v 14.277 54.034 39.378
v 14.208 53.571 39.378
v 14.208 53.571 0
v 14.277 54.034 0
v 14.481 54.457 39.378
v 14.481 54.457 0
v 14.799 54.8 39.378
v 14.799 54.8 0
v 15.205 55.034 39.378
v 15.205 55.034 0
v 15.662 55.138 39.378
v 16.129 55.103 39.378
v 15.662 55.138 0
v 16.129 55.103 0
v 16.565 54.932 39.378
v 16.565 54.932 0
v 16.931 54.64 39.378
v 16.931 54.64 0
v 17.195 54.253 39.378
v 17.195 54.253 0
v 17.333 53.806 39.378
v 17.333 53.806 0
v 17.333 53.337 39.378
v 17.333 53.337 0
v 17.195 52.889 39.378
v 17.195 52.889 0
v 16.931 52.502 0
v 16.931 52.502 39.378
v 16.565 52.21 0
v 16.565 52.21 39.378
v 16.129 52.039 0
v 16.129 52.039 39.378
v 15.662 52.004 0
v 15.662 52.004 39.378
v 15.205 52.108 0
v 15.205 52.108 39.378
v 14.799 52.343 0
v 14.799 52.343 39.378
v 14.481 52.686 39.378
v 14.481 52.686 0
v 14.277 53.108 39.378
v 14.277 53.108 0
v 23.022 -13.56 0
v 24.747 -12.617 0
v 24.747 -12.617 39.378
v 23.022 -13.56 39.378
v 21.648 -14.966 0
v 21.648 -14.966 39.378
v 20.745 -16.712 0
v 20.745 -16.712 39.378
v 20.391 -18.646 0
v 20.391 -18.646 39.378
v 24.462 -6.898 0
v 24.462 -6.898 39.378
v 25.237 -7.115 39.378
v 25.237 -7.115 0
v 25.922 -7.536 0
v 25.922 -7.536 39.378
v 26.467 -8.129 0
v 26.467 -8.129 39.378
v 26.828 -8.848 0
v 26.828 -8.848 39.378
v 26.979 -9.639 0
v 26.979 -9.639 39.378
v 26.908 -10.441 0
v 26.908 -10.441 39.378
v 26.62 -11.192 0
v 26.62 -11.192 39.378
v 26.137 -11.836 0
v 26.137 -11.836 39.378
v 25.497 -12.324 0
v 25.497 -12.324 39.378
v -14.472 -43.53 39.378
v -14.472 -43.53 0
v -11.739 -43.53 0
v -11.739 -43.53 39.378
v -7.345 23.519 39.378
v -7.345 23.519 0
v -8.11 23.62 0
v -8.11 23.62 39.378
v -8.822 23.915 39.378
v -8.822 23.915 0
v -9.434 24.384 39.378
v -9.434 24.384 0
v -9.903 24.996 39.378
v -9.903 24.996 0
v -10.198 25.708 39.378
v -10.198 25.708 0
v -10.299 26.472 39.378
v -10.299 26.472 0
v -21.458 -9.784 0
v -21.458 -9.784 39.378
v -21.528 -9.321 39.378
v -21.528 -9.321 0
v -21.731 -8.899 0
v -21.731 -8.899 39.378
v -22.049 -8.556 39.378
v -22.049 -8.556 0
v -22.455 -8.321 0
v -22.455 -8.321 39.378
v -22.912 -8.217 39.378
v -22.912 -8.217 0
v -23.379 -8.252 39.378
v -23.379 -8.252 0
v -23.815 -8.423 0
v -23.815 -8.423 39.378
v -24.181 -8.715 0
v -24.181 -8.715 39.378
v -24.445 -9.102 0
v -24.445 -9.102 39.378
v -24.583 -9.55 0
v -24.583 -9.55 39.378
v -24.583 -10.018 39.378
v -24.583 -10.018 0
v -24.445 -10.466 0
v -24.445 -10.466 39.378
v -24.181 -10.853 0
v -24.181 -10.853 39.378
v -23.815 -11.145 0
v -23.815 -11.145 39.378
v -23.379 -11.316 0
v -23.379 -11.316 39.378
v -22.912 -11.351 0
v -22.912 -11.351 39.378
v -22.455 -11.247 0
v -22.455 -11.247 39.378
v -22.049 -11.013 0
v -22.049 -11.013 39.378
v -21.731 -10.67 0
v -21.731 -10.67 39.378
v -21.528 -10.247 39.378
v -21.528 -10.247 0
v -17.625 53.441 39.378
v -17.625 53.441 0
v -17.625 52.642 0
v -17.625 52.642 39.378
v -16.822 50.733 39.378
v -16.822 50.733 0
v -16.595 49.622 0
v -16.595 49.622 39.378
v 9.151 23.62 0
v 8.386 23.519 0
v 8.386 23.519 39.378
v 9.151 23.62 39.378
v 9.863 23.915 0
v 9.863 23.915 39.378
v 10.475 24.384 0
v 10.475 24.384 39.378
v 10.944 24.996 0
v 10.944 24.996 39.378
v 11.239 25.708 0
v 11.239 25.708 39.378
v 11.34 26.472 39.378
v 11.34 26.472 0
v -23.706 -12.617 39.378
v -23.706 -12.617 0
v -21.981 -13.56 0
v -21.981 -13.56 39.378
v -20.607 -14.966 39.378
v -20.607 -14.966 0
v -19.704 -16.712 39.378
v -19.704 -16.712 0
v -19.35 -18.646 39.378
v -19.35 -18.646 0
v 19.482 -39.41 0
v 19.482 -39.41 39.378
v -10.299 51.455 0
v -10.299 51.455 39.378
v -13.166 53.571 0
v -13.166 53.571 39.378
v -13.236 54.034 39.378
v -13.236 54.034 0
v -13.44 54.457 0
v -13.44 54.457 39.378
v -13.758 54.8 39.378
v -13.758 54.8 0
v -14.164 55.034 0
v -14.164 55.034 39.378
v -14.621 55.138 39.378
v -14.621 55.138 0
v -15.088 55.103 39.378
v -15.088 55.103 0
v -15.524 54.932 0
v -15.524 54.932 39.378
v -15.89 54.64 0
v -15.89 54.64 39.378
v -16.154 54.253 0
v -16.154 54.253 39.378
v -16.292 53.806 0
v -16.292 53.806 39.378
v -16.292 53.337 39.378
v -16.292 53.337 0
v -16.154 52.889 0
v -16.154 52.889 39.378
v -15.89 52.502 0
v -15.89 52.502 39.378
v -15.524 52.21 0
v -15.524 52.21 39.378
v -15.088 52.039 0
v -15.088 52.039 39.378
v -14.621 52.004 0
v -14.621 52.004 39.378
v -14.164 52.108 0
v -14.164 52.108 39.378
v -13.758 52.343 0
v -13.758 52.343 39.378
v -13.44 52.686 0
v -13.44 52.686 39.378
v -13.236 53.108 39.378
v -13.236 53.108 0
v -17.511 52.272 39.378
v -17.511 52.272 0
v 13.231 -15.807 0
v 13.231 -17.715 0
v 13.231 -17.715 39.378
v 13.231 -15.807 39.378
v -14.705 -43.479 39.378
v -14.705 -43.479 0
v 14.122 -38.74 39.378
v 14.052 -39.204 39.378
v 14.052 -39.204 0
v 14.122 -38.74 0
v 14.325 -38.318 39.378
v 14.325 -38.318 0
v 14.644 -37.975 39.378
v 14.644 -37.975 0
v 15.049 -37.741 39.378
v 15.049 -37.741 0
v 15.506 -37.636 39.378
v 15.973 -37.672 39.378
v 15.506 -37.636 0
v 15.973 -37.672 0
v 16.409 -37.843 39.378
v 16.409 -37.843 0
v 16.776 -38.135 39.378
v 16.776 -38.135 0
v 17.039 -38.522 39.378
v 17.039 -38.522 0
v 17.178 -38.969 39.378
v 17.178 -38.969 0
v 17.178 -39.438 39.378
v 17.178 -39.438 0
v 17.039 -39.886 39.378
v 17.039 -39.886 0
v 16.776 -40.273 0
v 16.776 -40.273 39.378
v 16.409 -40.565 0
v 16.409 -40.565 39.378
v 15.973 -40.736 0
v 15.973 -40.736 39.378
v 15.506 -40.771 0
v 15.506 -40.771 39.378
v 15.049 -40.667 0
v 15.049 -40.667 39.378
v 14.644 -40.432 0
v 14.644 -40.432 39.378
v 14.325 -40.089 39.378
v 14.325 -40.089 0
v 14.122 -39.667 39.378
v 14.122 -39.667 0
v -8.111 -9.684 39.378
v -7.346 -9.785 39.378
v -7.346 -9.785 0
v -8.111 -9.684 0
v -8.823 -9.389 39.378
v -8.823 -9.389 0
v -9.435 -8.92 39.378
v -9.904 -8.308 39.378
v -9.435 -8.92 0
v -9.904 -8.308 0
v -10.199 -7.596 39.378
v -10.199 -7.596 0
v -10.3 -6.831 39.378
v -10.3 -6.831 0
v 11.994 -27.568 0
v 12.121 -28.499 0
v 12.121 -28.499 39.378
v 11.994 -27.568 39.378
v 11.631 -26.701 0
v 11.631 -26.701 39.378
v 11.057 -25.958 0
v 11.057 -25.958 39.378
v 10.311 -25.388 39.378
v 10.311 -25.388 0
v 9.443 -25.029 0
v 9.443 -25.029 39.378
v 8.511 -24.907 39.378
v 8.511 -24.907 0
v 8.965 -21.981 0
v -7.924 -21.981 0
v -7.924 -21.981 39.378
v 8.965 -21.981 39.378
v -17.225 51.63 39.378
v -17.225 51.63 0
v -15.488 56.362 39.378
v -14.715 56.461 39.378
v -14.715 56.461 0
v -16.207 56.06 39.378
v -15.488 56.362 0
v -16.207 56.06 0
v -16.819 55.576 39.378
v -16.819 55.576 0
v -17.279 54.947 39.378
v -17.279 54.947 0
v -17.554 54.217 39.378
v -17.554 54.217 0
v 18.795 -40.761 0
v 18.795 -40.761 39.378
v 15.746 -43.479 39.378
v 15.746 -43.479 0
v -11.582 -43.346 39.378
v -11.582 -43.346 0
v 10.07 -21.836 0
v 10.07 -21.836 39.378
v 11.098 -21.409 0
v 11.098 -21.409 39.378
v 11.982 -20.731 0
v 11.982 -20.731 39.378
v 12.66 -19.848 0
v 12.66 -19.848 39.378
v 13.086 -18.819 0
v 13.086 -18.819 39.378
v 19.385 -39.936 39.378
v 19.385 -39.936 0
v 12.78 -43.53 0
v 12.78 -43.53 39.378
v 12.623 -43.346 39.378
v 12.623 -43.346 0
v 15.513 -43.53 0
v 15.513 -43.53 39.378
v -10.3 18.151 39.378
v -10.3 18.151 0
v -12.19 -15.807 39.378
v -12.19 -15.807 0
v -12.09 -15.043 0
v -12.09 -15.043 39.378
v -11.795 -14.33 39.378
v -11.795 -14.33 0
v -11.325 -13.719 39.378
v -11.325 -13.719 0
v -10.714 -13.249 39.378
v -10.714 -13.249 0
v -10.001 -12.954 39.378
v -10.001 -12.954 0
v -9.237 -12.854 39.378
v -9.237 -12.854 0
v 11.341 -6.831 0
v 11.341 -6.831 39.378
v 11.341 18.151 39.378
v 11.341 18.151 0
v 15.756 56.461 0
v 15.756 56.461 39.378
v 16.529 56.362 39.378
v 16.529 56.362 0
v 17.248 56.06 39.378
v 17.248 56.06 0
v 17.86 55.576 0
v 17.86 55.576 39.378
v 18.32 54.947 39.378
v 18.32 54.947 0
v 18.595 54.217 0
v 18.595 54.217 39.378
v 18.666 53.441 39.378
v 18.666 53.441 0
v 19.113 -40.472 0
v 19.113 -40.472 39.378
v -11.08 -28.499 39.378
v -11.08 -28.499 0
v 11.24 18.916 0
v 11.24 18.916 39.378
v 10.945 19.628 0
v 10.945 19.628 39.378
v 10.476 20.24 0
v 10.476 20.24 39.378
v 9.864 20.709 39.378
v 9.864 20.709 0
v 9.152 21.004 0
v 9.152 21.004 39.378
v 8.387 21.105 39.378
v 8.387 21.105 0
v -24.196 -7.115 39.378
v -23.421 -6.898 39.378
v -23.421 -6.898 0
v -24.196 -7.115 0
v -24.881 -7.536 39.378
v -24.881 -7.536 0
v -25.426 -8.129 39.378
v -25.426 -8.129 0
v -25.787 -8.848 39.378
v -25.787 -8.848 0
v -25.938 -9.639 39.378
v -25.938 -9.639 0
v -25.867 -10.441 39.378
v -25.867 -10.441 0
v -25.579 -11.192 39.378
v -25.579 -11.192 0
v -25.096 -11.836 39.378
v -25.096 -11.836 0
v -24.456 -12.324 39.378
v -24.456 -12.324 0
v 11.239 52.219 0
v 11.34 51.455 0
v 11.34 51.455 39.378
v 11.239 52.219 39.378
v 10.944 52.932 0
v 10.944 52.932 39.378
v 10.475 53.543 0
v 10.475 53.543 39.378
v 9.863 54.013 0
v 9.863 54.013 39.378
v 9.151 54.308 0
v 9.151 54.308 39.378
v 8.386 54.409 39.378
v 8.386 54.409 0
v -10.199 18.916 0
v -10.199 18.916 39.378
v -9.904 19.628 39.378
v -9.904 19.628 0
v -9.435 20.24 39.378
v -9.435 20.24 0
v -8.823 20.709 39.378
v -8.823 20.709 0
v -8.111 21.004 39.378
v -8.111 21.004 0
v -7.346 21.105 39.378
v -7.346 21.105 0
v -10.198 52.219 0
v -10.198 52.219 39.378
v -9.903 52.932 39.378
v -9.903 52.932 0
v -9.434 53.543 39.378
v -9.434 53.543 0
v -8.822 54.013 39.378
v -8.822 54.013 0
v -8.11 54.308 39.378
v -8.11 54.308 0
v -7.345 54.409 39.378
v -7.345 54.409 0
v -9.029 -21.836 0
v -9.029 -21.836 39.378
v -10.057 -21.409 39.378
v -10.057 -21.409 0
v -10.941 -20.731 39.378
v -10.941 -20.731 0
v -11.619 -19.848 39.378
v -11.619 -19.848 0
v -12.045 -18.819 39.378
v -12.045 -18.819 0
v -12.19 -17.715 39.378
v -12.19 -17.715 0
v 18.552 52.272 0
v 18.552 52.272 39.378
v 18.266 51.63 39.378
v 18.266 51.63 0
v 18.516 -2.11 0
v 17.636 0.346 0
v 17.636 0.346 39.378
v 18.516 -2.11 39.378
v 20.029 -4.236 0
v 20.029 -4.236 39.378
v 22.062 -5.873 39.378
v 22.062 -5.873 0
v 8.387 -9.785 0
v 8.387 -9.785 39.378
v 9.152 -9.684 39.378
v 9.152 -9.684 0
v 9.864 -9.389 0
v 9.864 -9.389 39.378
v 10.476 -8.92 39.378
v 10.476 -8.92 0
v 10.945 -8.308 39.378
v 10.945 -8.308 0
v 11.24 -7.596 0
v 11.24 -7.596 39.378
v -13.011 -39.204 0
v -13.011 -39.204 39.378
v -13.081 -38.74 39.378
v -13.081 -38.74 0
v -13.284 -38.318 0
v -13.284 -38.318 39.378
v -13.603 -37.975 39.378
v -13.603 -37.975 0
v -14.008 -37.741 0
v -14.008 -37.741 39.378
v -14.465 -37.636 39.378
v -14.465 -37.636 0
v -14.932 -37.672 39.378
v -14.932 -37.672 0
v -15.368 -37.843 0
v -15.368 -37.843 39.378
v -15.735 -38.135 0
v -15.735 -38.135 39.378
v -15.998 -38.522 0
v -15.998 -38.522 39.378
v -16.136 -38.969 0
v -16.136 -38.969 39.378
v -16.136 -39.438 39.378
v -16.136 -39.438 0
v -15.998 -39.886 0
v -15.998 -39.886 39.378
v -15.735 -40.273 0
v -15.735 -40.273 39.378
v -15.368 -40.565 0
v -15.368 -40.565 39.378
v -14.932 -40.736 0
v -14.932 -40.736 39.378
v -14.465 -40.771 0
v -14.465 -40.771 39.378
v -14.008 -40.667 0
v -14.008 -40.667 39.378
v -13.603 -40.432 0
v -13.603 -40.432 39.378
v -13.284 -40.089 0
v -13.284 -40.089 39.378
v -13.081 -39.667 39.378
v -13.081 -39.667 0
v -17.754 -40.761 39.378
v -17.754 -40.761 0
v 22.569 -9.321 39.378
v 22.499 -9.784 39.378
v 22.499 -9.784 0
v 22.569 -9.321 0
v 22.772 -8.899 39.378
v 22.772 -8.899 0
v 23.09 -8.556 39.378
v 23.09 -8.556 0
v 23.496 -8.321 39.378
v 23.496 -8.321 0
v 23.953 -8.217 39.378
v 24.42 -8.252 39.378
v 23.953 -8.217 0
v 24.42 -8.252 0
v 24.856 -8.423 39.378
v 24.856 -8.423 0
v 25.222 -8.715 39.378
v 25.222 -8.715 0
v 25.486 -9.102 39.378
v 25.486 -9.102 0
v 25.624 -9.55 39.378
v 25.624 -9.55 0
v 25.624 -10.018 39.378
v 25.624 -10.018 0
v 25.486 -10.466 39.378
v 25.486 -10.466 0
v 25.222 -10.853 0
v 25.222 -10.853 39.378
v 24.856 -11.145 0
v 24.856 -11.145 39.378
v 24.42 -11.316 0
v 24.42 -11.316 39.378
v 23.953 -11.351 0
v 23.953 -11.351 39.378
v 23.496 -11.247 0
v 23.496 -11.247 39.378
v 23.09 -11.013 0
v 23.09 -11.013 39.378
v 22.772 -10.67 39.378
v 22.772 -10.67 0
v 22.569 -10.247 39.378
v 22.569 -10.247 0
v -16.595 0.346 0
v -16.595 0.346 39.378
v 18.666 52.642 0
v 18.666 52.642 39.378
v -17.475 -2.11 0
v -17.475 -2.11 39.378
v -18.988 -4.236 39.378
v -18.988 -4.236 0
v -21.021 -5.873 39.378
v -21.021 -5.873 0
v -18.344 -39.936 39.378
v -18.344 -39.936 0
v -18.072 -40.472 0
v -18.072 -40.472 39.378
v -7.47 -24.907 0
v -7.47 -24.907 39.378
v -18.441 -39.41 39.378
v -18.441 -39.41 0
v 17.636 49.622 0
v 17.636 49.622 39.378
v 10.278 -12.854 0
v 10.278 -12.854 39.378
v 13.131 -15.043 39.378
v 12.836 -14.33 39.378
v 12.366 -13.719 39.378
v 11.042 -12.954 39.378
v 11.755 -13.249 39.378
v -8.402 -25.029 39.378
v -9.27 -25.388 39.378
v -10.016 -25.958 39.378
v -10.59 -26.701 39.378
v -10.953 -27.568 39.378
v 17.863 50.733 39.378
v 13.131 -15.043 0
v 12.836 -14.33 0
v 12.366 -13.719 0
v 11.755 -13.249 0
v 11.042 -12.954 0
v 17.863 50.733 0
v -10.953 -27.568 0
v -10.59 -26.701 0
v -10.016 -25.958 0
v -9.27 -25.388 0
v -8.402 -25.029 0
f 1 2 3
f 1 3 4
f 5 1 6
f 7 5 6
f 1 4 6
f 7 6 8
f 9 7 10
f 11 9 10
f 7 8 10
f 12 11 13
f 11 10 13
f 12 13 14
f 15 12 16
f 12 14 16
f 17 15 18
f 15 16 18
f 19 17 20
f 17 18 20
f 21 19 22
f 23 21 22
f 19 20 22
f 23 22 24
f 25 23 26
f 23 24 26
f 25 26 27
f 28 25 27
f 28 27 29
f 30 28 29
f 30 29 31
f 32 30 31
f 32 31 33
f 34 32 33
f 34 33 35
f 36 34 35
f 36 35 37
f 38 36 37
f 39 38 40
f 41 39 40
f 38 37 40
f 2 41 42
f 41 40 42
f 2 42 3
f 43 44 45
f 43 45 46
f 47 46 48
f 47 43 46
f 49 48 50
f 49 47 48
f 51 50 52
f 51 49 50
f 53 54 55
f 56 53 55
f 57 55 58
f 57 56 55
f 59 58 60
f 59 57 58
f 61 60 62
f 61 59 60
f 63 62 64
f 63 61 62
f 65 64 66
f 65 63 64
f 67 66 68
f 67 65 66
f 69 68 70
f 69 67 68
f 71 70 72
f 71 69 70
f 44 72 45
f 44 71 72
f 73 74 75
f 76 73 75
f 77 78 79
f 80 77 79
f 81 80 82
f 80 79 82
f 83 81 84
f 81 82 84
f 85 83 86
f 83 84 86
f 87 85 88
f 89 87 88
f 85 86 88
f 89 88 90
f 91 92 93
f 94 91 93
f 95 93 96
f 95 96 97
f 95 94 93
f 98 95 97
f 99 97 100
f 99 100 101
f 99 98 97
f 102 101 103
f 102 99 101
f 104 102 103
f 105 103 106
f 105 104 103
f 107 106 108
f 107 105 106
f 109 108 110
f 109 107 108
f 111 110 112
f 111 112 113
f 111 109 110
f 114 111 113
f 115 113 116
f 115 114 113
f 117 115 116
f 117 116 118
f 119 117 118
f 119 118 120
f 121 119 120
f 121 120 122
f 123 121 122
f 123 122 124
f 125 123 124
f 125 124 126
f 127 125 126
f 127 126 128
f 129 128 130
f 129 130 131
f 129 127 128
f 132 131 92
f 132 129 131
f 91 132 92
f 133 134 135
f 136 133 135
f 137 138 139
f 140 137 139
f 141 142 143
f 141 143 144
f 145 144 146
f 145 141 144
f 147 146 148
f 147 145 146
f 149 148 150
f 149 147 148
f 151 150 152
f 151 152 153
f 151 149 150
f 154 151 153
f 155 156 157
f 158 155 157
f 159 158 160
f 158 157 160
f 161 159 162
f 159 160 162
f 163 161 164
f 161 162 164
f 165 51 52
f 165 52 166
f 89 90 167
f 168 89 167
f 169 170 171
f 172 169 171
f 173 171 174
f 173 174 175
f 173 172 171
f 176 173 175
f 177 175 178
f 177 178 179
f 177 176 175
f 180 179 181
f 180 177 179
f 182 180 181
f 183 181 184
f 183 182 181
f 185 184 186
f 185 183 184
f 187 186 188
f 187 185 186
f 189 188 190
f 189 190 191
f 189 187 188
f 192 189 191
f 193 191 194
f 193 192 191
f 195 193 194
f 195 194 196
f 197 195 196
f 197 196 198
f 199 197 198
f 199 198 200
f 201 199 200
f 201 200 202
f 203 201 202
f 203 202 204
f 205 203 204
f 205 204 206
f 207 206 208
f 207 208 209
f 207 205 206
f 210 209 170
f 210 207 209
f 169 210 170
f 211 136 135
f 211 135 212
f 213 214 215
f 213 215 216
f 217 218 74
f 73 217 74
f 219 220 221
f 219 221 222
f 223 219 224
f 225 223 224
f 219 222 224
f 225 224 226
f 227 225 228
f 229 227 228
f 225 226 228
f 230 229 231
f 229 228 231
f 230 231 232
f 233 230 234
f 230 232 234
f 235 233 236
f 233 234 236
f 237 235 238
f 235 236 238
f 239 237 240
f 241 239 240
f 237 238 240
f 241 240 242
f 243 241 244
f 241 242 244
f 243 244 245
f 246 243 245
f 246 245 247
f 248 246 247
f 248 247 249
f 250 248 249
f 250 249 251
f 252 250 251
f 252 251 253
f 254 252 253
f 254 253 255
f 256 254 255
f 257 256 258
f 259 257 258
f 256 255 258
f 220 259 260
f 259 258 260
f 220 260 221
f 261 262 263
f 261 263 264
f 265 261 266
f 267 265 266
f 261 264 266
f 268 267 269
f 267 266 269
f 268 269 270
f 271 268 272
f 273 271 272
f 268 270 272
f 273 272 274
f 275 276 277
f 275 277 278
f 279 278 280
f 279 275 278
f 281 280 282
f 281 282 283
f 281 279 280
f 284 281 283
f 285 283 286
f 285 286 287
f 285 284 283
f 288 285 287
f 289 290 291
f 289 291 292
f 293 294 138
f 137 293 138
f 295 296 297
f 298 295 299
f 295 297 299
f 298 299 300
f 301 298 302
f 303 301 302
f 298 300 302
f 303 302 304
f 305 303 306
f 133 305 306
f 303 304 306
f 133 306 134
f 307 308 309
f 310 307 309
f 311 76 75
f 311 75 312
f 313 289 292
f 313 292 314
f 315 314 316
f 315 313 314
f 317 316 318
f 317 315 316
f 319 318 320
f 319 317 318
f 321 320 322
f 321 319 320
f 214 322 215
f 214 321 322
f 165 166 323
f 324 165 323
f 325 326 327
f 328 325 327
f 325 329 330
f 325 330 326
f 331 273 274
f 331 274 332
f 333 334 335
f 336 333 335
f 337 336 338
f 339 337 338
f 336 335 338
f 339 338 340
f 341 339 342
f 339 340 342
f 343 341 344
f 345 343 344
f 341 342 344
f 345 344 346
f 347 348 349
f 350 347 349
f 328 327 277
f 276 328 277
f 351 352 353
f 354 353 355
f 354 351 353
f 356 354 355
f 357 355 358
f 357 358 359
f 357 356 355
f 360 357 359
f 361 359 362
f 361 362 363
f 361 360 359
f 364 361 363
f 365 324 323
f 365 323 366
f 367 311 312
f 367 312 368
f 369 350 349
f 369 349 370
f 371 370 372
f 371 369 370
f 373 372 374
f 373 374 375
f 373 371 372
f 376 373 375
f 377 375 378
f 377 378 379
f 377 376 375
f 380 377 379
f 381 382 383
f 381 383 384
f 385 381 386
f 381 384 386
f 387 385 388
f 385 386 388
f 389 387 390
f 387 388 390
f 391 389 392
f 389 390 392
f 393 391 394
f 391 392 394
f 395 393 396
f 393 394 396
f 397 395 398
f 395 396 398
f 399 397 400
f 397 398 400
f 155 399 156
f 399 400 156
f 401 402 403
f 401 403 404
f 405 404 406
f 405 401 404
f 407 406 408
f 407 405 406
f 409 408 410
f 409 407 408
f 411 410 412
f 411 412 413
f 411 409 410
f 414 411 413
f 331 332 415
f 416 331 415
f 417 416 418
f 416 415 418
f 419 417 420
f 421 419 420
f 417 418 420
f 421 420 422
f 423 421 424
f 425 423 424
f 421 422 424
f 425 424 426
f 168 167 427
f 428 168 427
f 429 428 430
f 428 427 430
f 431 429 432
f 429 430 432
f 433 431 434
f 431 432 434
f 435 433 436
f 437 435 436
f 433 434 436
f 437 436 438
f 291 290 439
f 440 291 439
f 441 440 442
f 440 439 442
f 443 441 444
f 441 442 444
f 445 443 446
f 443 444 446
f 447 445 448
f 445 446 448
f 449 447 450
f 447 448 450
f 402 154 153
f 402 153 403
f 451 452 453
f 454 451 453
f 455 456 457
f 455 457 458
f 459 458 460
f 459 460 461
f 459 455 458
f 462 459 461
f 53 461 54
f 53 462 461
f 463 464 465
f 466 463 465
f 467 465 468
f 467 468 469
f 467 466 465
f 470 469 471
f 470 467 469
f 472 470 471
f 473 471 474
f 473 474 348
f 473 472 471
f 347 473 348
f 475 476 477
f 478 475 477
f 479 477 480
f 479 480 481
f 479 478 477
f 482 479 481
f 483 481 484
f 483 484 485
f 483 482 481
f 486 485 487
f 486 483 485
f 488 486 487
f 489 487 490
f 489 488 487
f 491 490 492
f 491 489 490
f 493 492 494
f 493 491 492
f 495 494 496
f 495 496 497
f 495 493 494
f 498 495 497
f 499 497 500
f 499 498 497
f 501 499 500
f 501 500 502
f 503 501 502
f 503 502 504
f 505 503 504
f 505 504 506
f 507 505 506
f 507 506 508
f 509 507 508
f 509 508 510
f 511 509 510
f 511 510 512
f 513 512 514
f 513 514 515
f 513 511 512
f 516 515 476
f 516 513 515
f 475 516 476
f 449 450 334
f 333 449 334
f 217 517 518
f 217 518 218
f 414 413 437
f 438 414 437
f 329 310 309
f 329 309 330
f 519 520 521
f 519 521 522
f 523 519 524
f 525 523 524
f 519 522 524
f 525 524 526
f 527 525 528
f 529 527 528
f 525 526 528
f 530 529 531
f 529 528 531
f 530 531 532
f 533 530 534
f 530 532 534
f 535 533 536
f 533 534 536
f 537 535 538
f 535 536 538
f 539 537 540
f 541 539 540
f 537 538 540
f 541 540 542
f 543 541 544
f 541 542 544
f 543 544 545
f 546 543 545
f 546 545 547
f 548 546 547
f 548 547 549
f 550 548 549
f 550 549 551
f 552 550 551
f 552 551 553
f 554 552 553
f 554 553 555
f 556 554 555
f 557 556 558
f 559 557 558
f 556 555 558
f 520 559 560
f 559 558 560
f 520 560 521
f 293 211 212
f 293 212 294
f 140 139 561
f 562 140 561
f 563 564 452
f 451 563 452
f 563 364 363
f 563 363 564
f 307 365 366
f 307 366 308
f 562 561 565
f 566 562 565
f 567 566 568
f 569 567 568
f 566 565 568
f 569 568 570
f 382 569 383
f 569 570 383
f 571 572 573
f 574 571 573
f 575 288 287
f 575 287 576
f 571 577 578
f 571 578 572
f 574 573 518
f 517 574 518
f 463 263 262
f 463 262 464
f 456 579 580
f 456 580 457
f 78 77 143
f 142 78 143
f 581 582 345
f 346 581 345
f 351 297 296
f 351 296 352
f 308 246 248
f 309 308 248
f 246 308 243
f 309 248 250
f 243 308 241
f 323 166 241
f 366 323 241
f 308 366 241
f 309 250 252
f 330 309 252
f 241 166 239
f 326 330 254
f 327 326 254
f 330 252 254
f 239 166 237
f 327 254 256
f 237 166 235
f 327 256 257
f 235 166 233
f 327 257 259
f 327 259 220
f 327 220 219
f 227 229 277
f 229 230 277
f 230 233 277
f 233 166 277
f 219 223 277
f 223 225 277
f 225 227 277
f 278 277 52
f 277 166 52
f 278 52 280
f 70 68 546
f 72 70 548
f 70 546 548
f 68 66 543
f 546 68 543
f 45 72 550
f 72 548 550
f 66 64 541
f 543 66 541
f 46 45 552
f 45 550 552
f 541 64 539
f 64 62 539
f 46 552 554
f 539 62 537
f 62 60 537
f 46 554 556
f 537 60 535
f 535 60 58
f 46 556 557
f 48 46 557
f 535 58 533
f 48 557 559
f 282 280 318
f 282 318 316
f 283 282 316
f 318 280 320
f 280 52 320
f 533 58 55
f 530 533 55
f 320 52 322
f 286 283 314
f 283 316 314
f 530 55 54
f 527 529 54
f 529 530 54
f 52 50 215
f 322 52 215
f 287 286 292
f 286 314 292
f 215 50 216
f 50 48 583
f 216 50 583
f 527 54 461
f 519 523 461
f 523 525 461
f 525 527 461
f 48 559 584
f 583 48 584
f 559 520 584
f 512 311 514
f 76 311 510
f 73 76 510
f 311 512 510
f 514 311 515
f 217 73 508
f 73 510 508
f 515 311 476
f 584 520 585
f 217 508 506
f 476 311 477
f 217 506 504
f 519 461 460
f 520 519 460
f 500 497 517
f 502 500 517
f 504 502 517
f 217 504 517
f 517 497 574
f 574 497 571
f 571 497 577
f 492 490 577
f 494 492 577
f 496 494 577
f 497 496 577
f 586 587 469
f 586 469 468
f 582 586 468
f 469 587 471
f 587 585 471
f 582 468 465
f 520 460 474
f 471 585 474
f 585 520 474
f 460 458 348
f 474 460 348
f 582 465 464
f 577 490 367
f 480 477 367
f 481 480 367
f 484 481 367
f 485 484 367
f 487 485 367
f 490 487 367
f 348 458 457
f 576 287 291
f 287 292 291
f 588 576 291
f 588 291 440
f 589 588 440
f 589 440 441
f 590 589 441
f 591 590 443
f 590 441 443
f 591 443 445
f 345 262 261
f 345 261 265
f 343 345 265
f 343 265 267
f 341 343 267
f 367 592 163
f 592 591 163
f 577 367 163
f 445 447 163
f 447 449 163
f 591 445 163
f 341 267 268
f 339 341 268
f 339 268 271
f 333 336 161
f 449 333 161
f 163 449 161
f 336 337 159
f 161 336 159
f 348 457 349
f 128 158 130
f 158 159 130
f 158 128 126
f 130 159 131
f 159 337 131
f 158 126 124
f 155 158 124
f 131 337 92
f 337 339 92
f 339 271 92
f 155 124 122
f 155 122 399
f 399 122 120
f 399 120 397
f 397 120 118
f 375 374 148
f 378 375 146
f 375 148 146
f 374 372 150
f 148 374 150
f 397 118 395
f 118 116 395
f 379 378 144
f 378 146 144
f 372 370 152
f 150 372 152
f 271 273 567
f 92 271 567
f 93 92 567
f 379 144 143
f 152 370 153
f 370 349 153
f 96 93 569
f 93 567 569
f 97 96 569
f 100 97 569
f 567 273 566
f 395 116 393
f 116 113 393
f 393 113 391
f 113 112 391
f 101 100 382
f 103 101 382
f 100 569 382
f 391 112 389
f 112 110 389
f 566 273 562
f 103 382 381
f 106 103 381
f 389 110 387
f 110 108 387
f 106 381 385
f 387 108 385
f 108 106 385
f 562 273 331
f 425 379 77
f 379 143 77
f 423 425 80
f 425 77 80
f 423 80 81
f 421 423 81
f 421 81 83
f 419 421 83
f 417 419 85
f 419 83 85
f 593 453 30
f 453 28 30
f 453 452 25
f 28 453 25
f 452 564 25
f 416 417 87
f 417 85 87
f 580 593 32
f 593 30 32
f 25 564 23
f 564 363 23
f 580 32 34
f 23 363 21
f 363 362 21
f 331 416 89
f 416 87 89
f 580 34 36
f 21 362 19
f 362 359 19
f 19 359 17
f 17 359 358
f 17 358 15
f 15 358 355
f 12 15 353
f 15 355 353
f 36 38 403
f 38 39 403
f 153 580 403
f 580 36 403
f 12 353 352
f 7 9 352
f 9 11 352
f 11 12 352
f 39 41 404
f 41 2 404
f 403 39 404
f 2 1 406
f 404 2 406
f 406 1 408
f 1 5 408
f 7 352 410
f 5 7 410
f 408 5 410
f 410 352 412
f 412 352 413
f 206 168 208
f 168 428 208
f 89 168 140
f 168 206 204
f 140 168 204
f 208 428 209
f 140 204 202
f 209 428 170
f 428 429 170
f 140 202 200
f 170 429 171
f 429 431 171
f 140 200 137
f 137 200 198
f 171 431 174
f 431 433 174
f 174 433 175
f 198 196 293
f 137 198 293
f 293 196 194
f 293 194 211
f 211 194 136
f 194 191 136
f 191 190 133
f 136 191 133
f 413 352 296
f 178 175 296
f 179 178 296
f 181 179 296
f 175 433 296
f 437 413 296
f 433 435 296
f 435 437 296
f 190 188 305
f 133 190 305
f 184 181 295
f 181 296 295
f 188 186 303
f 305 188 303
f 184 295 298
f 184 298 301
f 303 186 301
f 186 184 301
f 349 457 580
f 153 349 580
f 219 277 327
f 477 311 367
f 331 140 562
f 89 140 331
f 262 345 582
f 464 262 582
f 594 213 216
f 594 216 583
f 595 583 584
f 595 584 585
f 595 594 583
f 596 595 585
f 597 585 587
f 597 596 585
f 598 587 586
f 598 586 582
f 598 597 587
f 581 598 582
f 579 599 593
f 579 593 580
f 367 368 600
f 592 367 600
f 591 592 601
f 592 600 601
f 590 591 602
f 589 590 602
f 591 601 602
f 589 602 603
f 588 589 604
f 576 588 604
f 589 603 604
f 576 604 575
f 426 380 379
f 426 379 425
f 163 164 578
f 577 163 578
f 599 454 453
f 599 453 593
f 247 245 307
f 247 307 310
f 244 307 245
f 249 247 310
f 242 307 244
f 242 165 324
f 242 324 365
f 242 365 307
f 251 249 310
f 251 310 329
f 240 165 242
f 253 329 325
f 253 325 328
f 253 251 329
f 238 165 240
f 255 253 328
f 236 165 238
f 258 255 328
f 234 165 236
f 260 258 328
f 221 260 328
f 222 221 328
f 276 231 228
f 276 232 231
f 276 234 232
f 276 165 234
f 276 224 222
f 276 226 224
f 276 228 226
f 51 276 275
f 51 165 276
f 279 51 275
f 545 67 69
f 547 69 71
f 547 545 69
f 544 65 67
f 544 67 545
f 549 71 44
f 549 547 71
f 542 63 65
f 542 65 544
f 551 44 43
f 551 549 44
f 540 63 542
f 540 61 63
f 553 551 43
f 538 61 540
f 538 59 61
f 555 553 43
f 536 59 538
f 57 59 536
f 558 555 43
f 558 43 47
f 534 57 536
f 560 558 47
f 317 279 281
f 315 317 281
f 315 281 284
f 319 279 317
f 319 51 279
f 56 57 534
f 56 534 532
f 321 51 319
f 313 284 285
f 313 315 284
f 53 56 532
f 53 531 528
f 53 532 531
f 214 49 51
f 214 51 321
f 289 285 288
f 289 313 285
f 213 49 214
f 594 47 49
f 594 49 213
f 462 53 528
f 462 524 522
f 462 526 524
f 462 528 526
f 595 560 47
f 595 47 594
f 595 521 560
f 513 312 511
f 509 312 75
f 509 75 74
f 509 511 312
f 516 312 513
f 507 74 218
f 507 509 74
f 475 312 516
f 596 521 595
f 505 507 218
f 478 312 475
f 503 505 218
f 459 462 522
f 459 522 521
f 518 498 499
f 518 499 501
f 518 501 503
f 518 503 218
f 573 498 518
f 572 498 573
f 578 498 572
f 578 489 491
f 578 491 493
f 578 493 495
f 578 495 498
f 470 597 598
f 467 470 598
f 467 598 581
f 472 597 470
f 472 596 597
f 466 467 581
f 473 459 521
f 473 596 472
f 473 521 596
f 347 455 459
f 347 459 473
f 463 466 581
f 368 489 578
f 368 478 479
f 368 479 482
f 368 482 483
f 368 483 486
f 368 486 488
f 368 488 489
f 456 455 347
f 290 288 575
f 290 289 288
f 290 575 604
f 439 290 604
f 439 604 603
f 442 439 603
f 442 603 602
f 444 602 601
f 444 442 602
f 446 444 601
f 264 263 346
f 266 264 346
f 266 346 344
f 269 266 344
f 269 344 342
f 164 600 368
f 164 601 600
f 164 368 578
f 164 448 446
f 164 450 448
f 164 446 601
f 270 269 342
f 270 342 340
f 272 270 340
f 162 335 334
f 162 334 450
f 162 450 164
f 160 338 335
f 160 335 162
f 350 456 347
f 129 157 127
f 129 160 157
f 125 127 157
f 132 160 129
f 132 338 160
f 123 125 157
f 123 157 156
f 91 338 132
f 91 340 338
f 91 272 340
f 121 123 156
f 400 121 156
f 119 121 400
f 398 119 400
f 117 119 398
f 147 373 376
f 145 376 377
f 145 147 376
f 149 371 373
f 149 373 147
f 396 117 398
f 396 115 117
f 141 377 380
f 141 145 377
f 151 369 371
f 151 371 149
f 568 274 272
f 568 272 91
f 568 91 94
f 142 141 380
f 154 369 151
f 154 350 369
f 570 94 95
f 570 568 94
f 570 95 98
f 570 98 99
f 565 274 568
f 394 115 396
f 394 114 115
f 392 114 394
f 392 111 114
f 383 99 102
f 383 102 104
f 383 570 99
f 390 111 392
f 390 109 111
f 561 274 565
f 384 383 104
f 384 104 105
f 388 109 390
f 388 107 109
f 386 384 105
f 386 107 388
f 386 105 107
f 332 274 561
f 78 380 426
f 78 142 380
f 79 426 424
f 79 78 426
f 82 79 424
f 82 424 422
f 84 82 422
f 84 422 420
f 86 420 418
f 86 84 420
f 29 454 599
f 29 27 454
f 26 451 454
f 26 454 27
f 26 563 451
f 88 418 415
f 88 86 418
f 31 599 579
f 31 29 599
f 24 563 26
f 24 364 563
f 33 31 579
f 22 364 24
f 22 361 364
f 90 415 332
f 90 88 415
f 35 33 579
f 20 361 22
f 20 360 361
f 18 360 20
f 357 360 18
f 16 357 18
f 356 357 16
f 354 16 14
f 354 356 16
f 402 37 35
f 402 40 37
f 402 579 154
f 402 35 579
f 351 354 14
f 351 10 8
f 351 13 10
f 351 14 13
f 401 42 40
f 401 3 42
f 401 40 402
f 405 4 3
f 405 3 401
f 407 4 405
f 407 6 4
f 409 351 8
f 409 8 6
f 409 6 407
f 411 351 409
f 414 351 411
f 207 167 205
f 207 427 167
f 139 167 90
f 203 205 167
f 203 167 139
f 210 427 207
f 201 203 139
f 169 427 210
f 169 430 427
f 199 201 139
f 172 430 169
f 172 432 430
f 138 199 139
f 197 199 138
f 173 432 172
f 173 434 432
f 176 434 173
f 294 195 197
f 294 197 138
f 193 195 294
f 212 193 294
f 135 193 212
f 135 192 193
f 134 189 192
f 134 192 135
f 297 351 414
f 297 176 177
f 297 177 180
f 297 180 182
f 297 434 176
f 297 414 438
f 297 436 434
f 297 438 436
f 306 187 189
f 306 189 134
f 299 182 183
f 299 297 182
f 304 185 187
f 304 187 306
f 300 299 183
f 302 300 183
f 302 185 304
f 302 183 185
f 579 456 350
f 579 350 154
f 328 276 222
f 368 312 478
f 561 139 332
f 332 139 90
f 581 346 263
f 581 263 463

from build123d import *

# Parameters (mm, degrees)
F0_R     = 2.3945844673
F1_DEPTH = 60
F3_SCALE = 0.6563


with BuildPart() as f1:
    # F0 (on Top) → F1 (new body)
    with BuildSketch(Plane.XY):
        with BuildLine():
            Line((-27.0389984867, 83.2772081509), (-26.4251961202, 81.9096698061))
            Line((-26.4251961202, 81.9096698061), (-26.0784868151, 80.2167370168))
            Line((-26.0784868151, 80.2167370168), (-26.0784868151, 5.1366092342))
            ThreePointArc((-26.0784868151, 5.1366092342), (-29.7252239834, -1.8462109586), (-36.4788286904, -5.9017372231))
            ThreePointArc((-36.4788286904, -5.9017372231), (-40.3150914077, -10.07792875), (-36.9143450669, -14.6158150015))
            ThreePointArc((-36.9143450669, -14.6158150015), (-32.1922887959, -18.1949867477), (-30.2764291391, -23.8019259832))
            Line((-30.2764291391, -23.8019259832), (-28.8915335984, -55.4398973488))
            Line((-28.8915335984, -55.4398973488), (-28.7443264889, -56.2413544219))
            Line((-28.7443264889, -56.2413544219), (-28.3286040912, -57.0579545856))
            Line((-28.3286040912, -57.0579545856), (-27.844521729, -57.4991165442))
            Line((-27.844521729, -57.4991165442), (-23.1986730857, -61.6394566898))
            Line((-23.1986730857, -61.6394566898), (-22.8441298419, -61.7180224508))
            Line((-22.8441298419, -61.7180224508), (-18.6802665162, -61.7180224508))
            Line((-18.6802665162, -61.7180224508), (-18.4410806307, -61.4369034612))
            Line((-18.4410806307, -61.4369034612), (-17.6754507656, -38.8146494524))
            ThreePointArc((-17.6754507656, -38.8146494524), (-16.0548504259, -34.9431431488), (-12.175320372, -33.3418458372))
            Line((-12.175320372, -33.3418458372), (0.0142386856, -33.3418458372))
            Line((0.0142386856, -33.3418458372), (0.0142386856, -28.883429572))
            Line((0.0142386856, -28.883429572), (-12.867449671, -28.883429572))
            ThreePointArc((-12.867449671, -28.883429572), (-17.4637841926, -26.979565476), (-19.3676482886, -22.3832309544))
            Line((-19.3676482886, -22.3832309544), (-19.3676482886, -19.4763654619))
            ThreePointArc((-19.3676482886, -19.4763654619), (-18.0495706302, -16.2942445028), (-14.867449671, -14.9761668444))
            Line((-14.867449671, -14.9761668444), (0.0142386856, -14.9761668444))
            Line((0.0142386856, -14.9761668444), (0.0142386856, -10.3005459473))
            Line((0.0142386856, -10.3005459473), (-11.9863399565, -10.3005459473))
            ThreePointArc((-11.9863399565, -10.3005459473), (-15.1684609157, -8.9824682889), (-16.4865385741, -5.8003473297))
            Line((-16.4865385741, -5.8003473297), (-16.4865385741, 32.2654335052))
            ThreePointArc((-16.4865385741, 32.2654335052), (-15.1684609157, 35.4475544644), (-11.9863399565, 36.7656321228))
            Line((-11.9863399565, 36.7656321228), (0.0142386856, 36.7656321228))
            Line((0.0142386856, 36.7656321228), (0.0142386856, 40.4444549151))
            Line((0.0142386856, 40.4444549151), (-11.9852216709, 40.4444549151))
            ThreePointArc((-11.9852216709, 40.4444549151), (-15.1673426301, 41.7625325735), (-16.4854202885, 44.9446535327))
            Line((-16.4854202885, 44.9446535327), (-16.4854202885, 83.0104343675))
            ThreePointArc((-16.4854202885, 83.0104343675), (-15.1673426301, 86.1925553267), (-11.9852216709, 87.5106329851))
            Line((-11.9852216709, 87.5106329851), (0.0142386856, 87.5106329851))
            Line((0.0142386856, 87.5106329851), (0.0142386856, 90.6373629034))
            Line((0.0142386856, 90.6373629034), (-23.213673197, 90.6373629034))
            ThreePointArc((-23.213673197, 90.6373629034), (-26.4197034776, 89.2897278228), (-27.6474967488, 86.0359186467))
            Line((-27.6474967488, 86.0359186467), (-27.6474967488, 84.8186316031))
            Line((-27.6474967488, 84.8186316031), (-27.4746276334, 84.2558386951))
            Line((-27.4746276334, 84.2558386951), (-27.0389984867, 83.2772081509))
        make_face()
        with Locations((-23.0123251677, -55.1256909966)):
            Circle(F0_R, mode=Mode.SUBTRACT)
        with Locations((-35.8826853335, -10.2994536757)):
            Circle(F0_R, mode=Mode.SUBTRACT)
        with Locations((-23.2493666078, 86.2348794977)):
            Circle(F0_R, mode=Mode.SUBTRACT)
    extrude(amount=F1_DEPTH)

    # F2: F1 across plane


with BuildPart() as f1_1:
    add(f1.part)
    add(f1.part.mirror(Plane.YZ))


with BuildPart() as f1_2:
    # F3: moved
    add(f1_1.part.scale(F3_SCALE).moved(Location((0.5205121011, -3.0246793772, 0))))


solid = f1_2.part
